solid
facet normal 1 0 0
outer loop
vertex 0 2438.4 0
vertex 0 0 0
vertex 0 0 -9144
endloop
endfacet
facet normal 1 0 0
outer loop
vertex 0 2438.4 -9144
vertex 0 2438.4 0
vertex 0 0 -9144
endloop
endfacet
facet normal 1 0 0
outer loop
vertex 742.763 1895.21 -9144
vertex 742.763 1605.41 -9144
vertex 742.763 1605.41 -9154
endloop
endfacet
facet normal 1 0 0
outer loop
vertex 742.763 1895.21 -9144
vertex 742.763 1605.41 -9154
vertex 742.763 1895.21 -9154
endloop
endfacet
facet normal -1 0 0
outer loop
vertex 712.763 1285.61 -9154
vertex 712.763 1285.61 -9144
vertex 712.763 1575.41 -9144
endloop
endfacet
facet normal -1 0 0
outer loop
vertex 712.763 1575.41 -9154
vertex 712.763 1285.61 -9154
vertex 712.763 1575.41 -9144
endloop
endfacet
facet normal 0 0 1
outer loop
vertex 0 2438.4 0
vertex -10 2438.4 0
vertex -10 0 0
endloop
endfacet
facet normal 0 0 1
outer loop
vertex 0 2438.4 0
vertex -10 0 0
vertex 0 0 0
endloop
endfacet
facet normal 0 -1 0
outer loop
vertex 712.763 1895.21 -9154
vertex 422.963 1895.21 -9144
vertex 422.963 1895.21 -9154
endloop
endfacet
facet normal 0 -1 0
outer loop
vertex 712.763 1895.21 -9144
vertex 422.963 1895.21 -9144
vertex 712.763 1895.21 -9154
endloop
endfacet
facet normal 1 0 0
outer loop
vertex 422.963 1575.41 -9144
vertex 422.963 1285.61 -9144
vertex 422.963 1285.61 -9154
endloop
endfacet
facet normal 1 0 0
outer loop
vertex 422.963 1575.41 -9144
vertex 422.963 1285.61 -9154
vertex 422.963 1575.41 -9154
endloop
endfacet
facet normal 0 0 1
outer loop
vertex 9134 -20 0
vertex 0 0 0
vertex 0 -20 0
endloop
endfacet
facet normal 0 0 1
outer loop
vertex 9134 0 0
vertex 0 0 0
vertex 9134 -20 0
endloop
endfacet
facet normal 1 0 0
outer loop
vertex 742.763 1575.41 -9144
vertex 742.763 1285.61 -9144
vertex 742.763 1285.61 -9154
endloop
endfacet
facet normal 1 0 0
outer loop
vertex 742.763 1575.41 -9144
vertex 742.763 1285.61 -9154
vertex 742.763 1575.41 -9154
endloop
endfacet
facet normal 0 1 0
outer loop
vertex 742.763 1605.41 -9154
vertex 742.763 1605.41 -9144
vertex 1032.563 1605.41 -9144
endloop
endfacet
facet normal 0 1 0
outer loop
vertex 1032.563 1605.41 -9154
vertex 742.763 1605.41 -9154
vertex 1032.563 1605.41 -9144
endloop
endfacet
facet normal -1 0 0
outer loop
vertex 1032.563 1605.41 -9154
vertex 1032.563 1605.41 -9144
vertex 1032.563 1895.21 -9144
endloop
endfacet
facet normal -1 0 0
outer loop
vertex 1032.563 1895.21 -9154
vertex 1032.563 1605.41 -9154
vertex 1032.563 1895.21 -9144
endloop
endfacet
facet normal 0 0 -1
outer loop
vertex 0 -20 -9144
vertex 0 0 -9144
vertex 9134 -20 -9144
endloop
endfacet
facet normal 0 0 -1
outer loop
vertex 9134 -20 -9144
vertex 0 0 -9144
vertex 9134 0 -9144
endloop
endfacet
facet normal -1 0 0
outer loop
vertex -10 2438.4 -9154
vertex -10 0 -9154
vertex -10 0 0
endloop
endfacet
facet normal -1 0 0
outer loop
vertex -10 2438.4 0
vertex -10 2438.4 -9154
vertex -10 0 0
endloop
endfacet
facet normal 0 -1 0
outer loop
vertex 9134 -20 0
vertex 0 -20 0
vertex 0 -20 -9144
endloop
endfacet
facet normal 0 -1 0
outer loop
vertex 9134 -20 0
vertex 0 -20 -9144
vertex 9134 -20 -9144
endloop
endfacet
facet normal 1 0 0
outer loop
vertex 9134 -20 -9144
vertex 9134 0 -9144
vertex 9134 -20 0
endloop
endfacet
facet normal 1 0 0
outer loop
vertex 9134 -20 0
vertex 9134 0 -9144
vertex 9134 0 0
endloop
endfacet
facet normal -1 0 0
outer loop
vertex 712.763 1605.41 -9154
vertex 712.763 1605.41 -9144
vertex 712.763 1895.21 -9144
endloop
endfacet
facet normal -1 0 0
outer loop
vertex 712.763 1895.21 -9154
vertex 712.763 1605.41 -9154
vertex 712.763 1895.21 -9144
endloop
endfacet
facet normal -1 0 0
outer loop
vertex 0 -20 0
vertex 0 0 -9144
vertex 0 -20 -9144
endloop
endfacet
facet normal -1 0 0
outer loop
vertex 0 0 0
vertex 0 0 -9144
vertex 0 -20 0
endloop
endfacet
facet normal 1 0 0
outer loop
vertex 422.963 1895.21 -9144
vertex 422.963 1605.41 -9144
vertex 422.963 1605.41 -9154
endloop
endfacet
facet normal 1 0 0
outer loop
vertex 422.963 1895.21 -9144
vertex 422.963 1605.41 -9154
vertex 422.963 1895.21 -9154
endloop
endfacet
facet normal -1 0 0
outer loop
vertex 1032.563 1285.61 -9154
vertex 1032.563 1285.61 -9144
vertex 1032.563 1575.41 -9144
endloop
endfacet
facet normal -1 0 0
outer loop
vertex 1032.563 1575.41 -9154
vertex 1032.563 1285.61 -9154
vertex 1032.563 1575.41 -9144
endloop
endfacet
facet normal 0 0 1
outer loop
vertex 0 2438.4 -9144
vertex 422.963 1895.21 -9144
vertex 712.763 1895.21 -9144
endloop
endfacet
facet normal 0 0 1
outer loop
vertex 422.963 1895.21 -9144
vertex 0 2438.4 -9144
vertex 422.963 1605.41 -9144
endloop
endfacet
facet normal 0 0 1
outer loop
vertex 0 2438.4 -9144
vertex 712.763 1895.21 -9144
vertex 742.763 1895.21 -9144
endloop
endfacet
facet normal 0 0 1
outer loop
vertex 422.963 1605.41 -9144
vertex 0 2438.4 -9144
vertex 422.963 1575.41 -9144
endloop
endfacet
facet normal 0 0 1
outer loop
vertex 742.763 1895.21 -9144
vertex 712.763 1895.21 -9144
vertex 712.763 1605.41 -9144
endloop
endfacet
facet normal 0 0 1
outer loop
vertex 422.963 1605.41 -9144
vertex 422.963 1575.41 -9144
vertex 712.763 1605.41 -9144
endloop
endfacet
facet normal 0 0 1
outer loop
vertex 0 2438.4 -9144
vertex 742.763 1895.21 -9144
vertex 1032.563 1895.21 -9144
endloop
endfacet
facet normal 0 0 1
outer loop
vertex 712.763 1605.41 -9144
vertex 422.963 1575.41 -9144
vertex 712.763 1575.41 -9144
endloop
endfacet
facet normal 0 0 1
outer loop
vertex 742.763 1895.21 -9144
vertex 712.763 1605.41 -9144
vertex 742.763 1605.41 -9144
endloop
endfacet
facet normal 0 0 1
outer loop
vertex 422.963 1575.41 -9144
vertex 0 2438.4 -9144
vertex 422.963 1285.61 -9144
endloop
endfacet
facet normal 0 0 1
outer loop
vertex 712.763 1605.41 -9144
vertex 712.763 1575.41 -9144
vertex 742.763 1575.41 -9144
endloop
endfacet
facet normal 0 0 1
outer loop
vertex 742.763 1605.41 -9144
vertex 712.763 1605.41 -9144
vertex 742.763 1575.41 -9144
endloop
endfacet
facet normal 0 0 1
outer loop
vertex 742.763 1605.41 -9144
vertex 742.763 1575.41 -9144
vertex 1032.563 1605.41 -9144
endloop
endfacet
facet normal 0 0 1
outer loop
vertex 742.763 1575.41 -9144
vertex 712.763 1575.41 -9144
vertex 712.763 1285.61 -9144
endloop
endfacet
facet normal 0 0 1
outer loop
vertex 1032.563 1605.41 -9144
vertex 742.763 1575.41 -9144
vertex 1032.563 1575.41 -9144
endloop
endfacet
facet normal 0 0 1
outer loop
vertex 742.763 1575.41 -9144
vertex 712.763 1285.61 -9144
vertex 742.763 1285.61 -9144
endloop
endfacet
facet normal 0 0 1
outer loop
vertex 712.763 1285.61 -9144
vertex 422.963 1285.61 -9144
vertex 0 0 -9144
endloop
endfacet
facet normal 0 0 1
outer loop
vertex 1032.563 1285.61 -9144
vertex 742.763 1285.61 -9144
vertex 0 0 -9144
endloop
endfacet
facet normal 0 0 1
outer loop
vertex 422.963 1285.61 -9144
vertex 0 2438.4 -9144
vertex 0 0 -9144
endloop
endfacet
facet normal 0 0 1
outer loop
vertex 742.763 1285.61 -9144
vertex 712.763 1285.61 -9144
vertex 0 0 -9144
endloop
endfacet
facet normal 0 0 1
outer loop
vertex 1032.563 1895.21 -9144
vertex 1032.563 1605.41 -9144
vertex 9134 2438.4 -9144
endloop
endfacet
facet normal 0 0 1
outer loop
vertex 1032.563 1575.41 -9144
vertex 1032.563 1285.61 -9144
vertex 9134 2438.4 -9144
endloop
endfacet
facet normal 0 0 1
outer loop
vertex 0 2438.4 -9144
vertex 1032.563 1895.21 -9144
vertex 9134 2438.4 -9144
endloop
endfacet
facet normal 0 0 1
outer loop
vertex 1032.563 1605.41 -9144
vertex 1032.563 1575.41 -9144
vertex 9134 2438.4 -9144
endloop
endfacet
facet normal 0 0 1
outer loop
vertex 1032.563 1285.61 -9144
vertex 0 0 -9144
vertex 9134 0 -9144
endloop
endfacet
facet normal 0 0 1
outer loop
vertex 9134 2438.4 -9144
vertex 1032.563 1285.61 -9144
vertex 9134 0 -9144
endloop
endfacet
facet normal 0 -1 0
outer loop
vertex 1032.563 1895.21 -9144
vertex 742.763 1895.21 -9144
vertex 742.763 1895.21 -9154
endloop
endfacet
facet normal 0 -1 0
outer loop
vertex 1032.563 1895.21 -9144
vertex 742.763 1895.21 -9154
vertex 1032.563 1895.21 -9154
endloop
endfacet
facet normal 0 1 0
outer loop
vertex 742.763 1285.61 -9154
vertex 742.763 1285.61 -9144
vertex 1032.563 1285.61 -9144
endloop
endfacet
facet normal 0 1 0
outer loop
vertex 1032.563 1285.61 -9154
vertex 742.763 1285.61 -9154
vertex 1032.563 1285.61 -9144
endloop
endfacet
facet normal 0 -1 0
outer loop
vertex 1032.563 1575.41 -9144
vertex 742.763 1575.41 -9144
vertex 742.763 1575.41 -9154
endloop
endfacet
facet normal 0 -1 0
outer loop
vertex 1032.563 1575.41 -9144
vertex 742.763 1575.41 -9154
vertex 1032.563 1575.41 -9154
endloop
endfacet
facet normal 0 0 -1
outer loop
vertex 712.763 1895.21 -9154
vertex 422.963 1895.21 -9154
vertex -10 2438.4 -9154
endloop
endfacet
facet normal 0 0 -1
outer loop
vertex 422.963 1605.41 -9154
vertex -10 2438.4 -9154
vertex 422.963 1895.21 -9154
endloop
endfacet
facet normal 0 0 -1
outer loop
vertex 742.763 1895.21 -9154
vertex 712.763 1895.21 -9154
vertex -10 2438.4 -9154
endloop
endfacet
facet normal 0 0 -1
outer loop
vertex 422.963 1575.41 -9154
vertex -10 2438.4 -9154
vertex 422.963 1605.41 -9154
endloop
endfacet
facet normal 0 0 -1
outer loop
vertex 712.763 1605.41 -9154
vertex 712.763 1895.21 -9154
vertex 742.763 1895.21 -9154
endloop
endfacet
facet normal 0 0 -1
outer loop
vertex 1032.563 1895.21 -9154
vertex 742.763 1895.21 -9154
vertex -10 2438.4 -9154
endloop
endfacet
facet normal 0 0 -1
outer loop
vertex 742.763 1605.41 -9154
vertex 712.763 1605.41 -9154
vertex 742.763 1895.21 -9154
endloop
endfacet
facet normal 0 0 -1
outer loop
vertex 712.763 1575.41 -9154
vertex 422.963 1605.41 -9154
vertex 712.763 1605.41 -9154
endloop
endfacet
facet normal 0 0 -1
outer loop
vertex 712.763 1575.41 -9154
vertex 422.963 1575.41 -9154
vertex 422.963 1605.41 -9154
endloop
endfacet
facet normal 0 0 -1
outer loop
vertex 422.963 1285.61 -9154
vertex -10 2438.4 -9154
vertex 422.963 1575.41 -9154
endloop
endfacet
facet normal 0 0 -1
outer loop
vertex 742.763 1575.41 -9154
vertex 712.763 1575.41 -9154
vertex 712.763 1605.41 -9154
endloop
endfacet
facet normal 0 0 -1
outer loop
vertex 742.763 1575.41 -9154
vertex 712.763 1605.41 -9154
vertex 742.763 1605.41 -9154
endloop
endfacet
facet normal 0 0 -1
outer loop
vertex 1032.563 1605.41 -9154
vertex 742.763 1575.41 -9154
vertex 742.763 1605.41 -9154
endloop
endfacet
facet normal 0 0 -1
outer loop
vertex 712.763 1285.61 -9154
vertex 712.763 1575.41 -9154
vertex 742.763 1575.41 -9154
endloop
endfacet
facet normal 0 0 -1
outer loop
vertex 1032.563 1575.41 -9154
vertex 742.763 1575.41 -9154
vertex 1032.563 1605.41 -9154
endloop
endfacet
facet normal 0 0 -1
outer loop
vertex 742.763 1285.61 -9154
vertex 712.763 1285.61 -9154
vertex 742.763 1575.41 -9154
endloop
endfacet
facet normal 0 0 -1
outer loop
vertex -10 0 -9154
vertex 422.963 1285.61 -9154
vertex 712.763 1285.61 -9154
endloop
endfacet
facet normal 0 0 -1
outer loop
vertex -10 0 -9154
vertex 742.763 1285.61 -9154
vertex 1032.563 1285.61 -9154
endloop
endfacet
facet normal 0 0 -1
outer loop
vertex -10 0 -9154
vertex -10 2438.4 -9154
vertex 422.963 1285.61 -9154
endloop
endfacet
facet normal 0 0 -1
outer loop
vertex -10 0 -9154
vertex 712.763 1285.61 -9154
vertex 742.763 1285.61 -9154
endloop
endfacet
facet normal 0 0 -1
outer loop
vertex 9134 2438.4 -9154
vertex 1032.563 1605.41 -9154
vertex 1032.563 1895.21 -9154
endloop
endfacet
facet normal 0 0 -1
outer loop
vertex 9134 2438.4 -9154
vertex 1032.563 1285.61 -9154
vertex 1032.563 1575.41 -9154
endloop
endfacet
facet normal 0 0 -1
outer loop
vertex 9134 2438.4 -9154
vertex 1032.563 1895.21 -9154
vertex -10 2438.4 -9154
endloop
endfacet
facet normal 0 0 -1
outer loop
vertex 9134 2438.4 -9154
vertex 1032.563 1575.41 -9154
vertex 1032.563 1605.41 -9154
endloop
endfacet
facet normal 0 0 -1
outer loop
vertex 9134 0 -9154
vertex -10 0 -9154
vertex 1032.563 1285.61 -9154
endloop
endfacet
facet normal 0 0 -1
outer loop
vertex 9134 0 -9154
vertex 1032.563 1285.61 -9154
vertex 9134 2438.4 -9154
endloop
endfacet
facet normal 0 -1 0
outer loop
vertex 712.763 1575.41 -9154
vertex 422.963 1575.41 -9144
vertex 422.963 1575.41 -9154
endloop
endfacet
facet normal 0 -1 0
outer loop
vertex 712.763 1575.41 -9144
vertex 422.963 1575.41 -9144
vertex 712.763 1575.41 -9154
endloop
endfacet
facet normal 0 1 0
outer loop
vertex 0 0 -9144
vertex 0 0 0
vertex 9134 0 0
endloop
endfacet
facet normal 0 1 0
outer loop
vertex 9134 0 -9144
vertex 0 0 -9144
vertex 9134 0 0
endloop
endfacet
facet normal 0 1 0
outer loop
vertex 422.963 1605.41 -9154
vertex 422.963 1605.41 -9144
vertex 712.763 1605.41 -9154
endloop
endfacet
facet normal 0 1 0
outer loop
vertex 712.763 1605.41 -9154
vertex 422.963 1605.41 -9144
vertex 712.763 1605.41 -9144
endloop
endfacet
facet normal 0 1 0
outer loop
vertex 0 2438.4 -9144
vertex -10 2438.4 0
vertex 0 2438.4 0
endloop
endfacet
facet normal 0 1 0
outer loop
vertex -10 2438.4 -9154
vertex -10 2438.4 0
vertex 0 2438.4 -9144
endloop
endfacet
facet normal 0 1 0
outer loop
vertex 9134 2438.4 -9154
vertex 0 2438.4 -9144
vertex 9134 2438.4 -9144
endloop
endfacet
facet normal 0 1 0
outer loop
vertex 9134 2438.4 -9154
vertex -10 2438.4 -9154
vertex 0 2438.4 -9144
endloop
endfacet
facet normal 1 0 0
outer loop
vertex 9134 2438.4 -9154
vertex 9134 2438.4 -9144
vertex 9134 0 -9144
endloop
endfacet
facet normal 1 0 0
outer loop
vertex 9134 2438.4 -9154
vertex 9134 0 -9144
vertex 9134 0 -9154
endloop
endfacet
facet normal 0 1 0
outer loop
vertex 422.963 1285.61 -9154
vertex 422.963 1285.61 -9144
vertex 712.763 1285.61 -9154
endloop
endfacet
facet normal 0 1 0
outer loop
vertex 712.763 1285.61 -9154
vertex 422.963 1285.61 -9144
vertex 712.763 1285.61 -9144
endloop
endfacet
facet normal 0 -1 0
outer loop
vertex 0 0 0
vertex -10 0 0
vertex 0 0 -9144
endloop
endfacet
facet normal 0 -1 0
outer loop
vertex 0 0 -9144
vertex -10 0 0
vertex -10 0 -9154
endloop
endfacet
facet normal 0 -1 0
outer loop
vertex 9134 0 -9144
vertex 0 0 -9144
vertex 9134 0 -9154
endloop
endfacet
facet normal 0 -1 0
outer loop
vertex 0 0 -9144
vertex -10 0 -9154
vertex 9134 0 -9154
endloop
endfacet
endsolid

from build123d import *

# Parameters (mm, degrees)
SKETCH1_W           = 10
SKETCH1_H           = 9144
SKETCH1_W_2         = 9144
SKETCH1_H_2         = 10
BOSS_EXTRUDE1_DEPTH = 2438.4
SKETCH3_W           = 289.8
SKETCH3_H           = 289.8
CUT_EXTRUDE1_DEPTH  = 11
SKETCH4_W           = 9134
SKETCH4_H           = 9144
BOSS_EXTRUDE3_DEPTH = 20


with BuildPart() as part:
    # Sketch1 → Boss-Extrude1 (new body)
    with BuildSketch(Plane(origin=(0, 0, 0), x_dir=(1, 0, 0), z_dir=(0, 1, 0))):
        with Locations((-5, 4572)):
            Rectangle(SKETCH1_W, SKETCH1_H)
        with Locations((4562, 9149)):
            Rectangle(SKETCH1_W_2, SKETCH1_H_2)
    extrude(amount=BOSS_EXTRUDE1_DEPTH)

    # Sketch3 → Cut-Extrude1 (cut, through all)
    with BuildSketch(Plane.XY.offset(-9144)):
        with Locations((567.862791314, 1750.309687089)):
            Rectangle(SKETCH3_W, SKETCH3_H)
        with Locations((887.662791314, 1750.309687089)):
            Rectangle(SKETCH3_W, SKETCH3_H)
        with Locations((887.662791314, 1430.509687089)):
            Rectangle(SKETCH3_W, SKETCH3_H)
        with Locations((567.862791314, 1430.509687089)):
            Rectangle(SKETCH3_W, SKETCH3_H)
    extrude(amount=-CUT_EXTRUDE1_DEPTH, mode=Mode.SUBTRACT)


with BuildPart() as body_2:
    # Sketch4 → Boss-Extrude3 (new body)
    with BuildSketch(Plane.XZ):
        with Locations((4567, -4572)):
            Rectangle(SKETCH4_W, SKETCH4_H)
    extrude(amount=BOSS_EXTRUDE3_DEPTH)


solid = Compound([part.part, body_2.part])
